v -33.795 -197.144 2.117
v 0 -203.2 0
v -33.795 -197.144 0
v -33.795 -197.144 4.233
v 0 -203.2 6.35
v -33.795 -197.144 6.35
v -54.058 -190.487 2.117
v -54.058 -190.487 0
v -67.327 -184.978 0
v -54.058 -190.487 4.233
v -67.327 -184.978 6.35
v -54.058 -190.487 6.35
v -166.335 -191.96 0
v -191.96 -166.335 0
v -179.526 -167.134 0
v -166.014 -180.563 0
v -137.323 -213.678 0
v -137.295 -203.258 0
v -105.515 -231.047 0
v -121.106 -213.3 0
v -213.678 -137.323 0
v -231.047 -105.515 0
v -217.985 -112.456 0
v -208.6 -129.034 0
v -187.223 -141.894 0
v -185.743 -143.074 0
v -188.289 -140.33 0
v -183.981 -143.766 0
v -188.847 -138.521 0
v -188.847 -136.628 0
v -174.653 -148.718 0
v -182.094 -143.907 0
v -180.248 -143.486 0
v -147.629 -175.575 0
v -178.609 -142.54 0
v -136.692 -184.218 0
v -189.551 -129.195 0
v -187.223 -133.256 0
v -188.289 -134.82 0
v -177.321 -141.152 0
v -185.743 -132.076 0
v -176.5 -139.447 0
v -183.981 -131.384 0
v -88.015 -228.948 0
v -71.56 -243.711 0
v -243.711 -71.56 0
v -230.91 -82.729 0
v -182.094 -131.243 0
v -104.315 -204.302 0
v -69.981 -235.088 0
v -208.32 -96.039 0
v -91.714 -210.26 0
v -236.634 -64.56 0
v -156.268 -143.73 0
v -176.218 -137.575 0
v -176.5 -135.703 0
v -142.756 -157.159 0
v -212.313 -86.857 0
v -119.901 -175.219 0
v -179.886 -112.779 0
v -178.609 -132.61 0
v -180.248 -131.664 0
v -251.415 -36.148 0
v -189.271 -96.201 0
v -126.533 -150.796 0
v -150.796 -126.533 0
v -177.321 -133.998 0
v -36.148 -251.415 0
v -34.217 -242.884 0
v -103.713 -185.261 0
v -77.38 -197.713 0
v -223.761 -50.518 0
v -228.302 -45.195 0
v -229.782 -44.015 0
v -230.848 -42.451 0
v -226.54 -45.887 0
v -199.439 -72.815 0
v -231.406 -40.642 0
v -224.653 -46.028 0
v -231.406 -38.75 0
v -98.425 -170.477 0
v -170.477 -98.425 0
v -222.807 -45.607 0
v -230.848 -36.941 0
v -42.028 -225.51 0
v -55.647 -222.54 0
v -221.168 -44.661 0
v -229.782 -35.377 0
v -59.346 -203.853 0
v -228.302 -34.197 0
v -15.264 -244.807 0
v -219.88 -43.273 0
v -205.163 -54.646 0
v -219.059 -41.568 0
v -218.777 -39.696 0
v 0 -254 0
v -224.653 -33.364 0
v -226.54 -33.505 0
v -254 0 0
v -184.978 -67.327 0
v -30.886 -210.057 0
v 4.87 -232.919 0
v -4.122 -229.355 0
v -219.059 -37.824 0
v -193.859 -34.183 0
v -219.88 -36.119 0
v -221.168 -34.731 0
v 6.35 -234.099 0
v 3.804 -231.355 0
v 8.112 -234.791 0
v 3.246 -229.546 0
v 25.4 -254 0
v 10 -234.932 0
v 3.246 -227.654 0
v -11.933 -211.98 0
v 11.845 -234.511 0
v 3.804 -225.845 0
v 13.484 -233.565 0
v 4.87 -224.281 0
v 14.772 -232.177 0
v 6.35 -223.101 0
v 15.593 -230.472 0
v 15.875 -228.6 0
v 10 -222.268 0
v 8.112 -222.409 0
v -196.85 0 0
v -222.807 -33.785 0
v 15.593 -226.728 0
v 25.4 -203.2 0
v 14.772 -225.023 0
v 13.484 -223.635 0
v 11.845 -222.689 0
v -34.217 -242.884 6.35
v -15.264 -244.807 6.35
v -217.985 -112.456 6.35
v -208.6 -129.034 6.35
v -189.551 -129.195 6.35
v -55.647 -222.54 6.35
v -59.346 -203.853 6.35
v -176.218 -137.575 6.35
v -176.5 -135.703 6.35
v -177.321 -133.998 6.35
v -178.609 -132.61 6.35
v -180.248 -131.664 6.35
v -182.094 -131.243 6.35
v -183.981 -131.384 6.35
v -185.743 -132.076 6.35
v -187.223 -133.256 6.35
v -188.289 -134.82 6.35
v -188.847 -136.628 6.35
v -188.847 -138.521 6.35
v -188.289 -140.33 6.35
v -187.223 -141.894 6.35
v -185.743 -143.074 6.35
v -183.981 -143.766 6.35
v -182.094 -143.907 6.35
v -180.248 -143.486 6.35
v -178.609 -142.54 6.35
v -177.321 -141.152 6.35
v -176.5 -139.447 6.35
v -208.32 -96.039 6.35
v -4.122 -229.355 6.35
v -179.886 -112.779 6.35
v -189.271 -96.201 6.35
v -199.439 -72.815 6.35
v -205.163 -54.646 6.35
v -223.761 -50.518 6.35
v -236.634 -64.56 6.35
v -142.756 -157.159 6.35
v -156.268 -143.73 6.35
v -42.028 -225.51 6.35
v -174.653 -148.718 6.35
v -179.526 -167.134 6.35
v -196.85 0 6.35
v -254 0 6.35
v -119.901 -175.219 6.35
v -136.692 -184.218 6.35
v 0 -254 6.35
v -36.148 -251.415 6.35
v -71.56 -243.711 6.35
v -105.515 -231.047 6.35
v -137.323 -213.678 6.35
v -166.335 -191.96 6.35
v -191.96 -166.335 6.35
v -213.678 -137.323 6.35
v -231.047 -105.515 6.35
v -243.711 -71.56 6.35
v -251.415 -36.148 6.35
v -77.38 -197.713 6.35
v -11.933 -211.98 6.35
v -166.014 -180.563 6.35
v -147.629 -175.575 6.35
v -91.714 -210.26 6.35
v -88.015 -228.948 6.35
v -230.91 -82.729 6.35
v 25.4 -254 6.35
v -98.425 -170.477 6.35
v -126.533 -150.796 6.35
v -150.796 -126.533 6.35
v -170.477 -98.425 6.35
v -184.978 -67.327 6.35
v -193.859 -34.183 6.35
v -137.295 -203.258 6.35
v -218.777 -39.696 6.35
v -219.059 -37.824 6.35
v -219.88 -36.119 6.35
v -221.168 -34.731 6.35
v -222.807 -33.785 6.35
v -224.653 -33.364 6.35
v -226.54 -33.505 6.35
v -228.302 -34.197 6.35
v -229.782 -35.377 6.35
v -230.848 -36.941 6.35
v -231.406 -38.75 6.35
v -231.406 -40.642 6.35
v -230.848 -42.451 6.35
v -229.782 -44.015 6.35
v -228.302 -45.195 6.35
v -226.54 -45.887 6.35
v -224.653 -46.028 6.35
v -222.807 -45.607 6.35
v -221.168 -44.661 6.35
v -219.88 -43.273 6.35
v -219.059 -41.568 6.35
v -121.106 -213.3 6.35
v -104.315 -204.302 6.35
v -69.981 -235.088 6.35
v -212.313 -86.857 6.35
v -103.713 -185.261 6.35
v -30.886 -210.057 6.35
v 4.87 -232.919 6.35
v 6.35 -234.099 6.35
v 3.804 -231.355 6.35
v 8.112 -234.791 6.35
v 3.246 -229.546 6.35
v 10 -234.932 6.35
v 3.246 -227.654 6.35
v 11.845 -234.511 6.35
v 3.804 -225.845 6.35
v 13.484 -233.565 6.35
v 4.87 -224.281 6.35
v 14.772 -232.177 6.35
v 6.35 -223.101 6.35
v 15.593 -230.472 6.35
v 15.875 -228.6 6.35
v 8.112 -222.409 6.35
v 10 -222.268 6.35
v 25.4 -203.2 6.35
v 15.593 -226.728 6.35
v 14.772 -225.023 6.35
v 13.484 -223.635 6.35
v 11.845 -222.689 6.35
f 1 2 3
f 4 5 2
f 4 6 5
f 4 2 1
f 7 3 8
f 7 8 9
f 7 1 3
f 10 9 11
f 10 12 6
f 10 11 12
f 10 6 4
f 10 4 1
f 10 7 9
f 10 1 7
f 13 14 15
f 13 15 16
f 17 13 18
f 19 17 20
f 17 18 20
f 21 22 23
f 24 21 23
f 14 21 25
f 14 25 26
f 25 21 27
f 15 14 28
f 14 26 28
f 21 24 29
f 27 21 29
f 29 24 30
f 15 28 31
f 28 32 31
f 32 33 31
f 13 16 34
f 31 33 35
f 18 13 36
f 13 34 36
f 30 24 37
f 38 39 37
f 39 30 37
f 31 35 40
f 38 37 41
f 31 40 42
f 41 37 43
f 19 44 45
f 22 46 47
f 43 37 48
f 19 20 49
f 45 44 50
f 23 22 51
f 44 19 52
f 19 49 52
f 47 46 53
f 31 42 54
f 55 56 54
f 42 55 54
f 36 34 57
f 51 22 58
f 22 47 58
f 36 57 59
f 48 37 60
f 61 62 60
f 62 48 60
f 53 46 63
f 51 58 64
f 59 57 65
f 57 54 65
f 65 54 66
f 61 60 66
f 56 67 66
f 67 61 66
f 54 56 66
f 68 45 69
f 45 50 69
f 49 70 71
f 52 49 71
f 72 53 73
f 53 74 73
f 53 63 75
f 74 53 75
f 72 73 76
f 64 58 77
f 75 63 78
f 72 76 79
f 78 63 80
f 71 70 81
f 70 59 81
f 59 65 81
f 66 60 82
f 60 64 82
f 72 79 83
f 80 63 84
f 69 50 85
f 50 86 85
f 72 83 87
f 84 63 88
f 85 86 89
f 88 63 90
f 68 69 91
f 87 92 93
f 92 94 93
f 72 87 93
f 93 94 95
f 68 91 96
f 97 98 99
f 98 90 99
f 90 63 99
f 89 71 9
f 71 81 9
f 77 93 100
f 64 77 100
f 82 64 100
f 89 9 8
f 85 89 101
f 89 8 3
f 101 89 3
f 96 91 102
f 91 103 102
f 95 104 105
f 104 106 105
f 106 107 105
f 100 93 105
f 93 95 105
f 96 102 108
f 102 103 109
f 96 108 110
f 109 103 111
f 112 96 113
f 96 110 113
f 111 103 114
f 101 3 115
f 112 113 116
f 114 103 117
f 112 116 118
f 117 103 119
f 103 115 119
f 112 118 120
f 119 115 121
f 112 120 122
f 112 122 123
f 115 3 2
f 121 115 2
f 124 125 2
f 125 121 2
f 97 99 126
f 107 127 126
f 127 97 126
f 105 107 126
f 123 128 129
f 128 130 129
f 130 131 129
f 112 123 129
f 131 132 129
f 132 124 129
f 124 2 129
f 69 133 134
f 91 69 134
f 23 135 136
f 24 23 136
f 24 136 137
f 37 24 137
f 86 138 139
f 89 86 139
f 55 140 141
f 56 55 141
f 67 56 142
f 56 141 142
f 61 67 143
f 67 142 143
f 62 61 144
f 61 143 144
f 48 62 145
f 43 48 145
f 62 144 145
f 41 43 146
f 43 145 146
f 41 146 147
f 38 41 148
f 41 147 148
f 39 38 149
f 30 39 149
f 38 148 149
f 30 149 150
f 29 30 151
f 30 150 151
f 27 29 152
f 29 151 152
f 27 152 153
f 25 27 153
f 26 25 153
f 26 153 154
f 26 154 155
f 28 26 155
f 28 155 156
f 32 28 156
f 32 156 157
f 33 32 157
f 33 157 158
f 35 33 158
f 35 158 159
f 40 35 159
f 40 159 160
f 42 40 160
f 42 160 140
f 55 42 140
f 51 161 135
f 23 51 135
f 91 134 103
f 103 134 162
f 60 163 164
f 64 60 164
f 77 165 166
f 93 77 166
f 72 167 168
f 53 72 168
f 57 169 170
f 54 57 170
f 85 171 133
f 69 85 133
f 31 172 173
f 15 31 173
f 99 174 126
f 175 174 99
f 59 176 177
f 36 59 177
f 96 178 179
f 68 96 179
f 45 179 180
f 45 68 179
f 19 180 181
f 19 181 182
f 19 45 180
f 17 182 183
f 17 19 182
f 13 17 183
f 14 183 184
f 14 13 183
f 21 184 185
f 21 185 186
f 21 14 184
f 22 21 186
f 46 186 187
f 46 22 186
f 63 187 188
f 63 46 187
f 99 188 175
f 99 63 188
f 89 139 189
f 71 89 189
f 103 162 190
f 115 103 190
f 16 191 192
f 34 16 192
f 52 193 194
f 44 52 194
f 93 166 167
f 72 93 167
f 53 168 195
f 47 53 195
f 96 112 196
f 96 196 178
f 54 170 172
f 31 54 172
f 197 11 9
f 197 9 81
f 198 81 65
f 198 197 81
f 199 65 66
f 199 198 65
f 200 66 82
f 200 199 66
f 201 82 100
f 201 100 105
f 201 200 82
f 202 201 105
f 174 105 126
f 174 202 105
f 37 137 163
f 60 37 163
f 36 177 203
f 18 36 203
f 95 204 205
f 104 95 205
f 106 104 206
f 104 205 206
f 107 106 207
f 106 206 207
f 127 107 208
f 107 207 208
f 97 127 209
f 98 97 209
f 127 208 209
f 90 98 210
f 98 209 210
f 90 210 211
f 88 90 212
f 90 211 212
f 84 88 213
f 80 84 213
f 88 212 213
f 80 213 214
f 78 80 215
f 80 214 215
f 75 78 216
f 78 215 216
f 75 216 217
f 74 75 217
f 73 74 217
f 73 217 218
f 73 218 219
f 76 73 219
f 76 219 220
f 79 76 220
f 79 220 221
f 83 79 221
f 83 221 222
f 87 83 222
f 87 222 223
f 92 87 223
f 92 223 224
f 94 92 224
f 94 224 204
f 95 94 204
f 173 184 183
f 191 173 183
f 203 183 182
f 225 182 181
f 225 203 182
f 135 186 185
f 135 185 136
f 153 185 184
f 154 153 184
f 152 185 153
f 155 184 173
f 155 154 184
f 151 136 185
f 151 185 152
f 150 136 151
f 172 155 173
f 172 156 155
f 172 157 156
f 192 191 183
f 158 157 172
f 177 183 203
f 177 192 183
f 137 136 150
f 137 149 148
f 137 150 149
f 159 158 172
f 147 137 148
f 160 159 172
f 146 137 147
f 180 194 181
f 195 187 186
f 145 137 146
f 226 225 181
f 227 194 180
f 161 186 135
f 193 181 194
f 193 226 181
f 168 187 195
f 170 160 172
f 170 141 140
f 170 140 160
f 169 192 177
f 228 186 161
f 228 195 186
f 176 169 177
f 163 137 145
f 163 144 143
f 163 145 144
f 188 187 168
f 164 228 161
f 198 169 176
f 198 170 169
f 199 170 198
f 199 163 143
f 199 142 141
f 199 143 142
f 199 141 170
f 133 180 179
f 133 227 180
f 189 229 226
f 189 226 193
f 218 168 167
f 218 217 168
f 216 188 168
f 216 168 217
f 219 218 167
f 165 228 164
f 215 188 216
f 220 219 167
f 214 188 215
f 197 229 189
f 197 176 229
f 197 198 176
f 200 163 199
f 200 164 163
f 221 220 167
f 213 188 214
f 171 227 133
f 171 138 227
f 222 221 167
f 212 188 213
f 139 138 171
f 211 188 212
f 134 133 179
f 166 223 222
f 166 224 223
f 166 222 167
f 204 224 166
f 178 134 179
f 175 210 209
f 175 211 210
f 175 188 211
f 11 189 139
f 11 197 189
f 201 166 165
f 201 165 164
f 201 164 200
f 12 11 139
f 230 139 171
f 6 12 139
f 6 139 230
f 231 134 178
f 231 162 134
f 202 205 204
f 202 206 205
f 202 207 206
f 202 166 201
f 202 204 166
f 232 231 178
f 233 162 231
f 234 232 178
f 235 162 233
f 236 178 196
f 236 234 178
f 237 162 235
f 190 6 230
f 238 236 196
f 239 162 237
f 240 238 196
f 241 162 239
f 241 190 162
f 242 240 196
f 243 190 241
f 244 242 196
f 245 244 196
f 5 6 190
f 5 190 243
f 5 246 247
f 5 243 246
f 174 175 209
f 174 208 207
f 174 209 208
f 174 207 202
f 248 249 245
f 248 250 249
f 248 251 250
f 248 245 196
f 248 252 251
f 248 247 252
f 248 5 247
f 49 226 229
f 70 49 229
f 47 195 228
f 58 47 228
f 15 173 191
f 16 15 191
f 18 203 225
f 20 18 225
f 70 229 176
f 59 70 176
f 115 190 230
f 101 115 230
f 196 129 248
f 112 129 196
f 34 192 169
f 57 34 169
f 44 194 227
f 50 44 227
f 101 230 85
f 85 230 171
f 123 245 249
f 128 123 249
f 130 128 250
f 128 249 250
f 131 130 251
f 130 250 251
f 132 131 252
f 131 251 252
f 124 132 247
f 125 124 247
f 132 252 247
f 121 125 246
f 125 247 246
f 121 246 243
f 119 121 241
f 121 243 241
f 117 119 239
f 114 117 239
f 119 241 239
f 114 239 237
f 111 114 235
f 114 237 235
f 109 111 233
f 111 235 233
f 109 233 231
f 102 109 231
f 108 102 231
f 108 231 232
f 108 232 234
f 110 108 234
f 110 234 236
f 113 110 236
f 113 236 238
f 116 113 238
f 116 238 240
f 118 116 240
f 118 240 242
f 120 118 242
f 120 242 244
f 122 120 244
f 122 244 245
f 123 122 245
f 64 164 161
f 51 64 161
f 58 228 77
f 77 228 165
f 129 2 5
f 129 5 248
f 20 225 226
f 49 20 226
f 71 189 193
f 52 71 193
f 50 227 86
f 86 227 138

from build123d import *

# Parameters (mm, degrees)
BOSS_EXTRUDE1_DEPTH = 6.35
CUT_EXTRUDE1_REACH  = 8.35
SKETCH3_R           = 6.35
CUT_EXTRUDE2_REACH  = 8.35
SKETCH4_R           = 6.35
BOSS_EXTRUDE2_DEPTH = 6.35
CUT_EXTRUDE4_DEPTH  = 7.3500001


with BuildPart() as part:
    # Sketch1 → Boss-Extrude1 (new body)
    with BuildSketch(Plane.XY):
        with BuildLine():
            Line((0, -203.2), (25.4, -203.2))
            Line((25.4, -203.2), (25.4, -254))
            Line((25.4, -254), (0, -254))
            ThreePointArc((0, -254), (-179.605122421, -179.605122421), (-254, 0))
            Line((-254, 0), (-203.2, 0))
            ThreePointArc((-203.2, 0), (-143.684097937, -143.684097937), (0, -203.2))
        make_face()
    extrude(amount=BOSS_EXTRUDE1_DEPTH)

    # Sketch3 → Cut-Extrude1 (cut, up to next)
    with BuildSketch(Plane.XY.offset(6.35), mode=Mode.PRIVATE) as cut_extrude1_sk1:
        with Locations((-182.568077597, -137.574914293)):
            Circle(SKETCH3_R)
    cut_extrude1_tool1 = extrude(cut_extrude1_sk1.sketch, amount=-CUT_EXTRUDE1_REACH, mode=Mode.PRIVATE) & part.part
    add(cut_extrude1_tool1.solids().sort_by_distance((-182.568078, -137.574914, 6.35))[0], mode=Mode.SUBTRACT)
    # Sketch3 → Cut-Extrude1 (cut, up to next)
    with BuildSketch(Plane.XY.offset(6.35), mode=Mode.PRIVATE) as cut_extrude1_sk2:
        with Locations((-225.127052339, -39.695973415)):
            Circle(SKETCH3_R)
    cut_extrude1_tool2 = extrude(cut_extrude1_sk2.sketch, amount=-CUT_EXTRUDE1_REACH, mode=Mode.PRIVATE) & part.part
    add(cut_extrude1_tool2.solids().sort_by_distance((-225.127052, -39.695973, 6.35))[0], mode=Mode.SUBTRACT)

    # Sketch4 → Cut-Extrude2 (cut, up to next)
    with BuildSketch(Plane.XY.offset(6.35), mode=Mode.PRIVATE) as cut_extrude2_sk1:
        with Locations((9.525, -228.6)):
            Circle(SKETCH4_R)
    cut_extrude2_tool1 = extrude(cut_extrude2_sk1.sketch, amount=-CUT_EXTRUDE2_REACH, mode=Mode.PRIVATE) & part.part
    add(cut_extrude2_tool1.solids().sort_by_distance((9.525, -228.6, 6.35))[0], mode=Mode.SUBTRACT)

    # Sketch5 → Boss-Extrude2 (add)
    with BuildSketch(Plane.XY.offset(6.35)):
        with BuildLine():
            Line((-196.85, 0), (-203.2, 0))
            ThreePointArc((-203.2, 0), (-143.684097937, -143.684097937), (0, -203.2))
            add(Edge.make_bspline(
                [(0, -203.2), (-42.738576364, -198.027670234), (-55.377716847, -189.330212239), (-67.326665214, -184.978492402)],
                knots=[0, 0, 0, 0, 1, 1, 1, 1], degree=3))
            ThreePointArc((-67.326665214, -184.978492402), (-161.250079918, -112.908521496), (-196.85, 0))
        make_face()
    extrude(amount=-BOSS_EXTRUDE2_DEPTH)

    # Sketch8 → Cut-Extrude4 (cut, through all)
    with BuildSketch(Plane.XY.offset(6.35)):
        Polygon((-189.550744798, -129.195114639), (-179.886192663, -112.778692007), (-189.270955635, -96.200733026), (-208.320270741, -96.039196678), (-217.984822875, -112.45561931), (-208.600059904, -129.033578291), align=None)
        Polygon((-212.312705004, -86.857226492), (-199.439243548, -72.815271852), (-205.163202257, -54.645549875), (-223.760622423, -50.51778254), (-236.634083879, -64.559737181), (-230.91012517, -82.729459157), align=None)
        Polygon((-147.628804374, -175.575051243), (-142.755562385, -157.158916673), (-156.267781768, -143.730498026), (-174.65324314, -148.71821395), (-179.526485129, -167.134348521), (-166.014265746, -180.562767167), align=None)
        Polygon((-104.315468483, -204.301604338), (-103.713008923, -185.261133166), (-119.901310879, -175.219152296), (-136.692072394, -184.217642598), (-137.294531954, -203.258113771), (-121.106229998, -213.300094641), align=None)
        Polygon((-55.647161568, -222.540459039), (-59.346411332, -203.853082252), (-77.379779242, -197.713038129), (-91.713897388, -210.260370793), (-88.014647624, -228.94774758), (-69.981279714, -235.087791703), align=None)
        Polygon((-4.122241516, -229.355334852), (-11.933301871, -211.980357553), (-30.886003779, -210.057445601), (-42.027645333, -225.509510947), (-34.216584978, -242.884488246), (-15.26388307, -244.807400198), align=None)
    extrude(amount=-CUT_EXTRUDE4_DEPTH, mode=Mode.SUBTRACT)


solid = part.part
